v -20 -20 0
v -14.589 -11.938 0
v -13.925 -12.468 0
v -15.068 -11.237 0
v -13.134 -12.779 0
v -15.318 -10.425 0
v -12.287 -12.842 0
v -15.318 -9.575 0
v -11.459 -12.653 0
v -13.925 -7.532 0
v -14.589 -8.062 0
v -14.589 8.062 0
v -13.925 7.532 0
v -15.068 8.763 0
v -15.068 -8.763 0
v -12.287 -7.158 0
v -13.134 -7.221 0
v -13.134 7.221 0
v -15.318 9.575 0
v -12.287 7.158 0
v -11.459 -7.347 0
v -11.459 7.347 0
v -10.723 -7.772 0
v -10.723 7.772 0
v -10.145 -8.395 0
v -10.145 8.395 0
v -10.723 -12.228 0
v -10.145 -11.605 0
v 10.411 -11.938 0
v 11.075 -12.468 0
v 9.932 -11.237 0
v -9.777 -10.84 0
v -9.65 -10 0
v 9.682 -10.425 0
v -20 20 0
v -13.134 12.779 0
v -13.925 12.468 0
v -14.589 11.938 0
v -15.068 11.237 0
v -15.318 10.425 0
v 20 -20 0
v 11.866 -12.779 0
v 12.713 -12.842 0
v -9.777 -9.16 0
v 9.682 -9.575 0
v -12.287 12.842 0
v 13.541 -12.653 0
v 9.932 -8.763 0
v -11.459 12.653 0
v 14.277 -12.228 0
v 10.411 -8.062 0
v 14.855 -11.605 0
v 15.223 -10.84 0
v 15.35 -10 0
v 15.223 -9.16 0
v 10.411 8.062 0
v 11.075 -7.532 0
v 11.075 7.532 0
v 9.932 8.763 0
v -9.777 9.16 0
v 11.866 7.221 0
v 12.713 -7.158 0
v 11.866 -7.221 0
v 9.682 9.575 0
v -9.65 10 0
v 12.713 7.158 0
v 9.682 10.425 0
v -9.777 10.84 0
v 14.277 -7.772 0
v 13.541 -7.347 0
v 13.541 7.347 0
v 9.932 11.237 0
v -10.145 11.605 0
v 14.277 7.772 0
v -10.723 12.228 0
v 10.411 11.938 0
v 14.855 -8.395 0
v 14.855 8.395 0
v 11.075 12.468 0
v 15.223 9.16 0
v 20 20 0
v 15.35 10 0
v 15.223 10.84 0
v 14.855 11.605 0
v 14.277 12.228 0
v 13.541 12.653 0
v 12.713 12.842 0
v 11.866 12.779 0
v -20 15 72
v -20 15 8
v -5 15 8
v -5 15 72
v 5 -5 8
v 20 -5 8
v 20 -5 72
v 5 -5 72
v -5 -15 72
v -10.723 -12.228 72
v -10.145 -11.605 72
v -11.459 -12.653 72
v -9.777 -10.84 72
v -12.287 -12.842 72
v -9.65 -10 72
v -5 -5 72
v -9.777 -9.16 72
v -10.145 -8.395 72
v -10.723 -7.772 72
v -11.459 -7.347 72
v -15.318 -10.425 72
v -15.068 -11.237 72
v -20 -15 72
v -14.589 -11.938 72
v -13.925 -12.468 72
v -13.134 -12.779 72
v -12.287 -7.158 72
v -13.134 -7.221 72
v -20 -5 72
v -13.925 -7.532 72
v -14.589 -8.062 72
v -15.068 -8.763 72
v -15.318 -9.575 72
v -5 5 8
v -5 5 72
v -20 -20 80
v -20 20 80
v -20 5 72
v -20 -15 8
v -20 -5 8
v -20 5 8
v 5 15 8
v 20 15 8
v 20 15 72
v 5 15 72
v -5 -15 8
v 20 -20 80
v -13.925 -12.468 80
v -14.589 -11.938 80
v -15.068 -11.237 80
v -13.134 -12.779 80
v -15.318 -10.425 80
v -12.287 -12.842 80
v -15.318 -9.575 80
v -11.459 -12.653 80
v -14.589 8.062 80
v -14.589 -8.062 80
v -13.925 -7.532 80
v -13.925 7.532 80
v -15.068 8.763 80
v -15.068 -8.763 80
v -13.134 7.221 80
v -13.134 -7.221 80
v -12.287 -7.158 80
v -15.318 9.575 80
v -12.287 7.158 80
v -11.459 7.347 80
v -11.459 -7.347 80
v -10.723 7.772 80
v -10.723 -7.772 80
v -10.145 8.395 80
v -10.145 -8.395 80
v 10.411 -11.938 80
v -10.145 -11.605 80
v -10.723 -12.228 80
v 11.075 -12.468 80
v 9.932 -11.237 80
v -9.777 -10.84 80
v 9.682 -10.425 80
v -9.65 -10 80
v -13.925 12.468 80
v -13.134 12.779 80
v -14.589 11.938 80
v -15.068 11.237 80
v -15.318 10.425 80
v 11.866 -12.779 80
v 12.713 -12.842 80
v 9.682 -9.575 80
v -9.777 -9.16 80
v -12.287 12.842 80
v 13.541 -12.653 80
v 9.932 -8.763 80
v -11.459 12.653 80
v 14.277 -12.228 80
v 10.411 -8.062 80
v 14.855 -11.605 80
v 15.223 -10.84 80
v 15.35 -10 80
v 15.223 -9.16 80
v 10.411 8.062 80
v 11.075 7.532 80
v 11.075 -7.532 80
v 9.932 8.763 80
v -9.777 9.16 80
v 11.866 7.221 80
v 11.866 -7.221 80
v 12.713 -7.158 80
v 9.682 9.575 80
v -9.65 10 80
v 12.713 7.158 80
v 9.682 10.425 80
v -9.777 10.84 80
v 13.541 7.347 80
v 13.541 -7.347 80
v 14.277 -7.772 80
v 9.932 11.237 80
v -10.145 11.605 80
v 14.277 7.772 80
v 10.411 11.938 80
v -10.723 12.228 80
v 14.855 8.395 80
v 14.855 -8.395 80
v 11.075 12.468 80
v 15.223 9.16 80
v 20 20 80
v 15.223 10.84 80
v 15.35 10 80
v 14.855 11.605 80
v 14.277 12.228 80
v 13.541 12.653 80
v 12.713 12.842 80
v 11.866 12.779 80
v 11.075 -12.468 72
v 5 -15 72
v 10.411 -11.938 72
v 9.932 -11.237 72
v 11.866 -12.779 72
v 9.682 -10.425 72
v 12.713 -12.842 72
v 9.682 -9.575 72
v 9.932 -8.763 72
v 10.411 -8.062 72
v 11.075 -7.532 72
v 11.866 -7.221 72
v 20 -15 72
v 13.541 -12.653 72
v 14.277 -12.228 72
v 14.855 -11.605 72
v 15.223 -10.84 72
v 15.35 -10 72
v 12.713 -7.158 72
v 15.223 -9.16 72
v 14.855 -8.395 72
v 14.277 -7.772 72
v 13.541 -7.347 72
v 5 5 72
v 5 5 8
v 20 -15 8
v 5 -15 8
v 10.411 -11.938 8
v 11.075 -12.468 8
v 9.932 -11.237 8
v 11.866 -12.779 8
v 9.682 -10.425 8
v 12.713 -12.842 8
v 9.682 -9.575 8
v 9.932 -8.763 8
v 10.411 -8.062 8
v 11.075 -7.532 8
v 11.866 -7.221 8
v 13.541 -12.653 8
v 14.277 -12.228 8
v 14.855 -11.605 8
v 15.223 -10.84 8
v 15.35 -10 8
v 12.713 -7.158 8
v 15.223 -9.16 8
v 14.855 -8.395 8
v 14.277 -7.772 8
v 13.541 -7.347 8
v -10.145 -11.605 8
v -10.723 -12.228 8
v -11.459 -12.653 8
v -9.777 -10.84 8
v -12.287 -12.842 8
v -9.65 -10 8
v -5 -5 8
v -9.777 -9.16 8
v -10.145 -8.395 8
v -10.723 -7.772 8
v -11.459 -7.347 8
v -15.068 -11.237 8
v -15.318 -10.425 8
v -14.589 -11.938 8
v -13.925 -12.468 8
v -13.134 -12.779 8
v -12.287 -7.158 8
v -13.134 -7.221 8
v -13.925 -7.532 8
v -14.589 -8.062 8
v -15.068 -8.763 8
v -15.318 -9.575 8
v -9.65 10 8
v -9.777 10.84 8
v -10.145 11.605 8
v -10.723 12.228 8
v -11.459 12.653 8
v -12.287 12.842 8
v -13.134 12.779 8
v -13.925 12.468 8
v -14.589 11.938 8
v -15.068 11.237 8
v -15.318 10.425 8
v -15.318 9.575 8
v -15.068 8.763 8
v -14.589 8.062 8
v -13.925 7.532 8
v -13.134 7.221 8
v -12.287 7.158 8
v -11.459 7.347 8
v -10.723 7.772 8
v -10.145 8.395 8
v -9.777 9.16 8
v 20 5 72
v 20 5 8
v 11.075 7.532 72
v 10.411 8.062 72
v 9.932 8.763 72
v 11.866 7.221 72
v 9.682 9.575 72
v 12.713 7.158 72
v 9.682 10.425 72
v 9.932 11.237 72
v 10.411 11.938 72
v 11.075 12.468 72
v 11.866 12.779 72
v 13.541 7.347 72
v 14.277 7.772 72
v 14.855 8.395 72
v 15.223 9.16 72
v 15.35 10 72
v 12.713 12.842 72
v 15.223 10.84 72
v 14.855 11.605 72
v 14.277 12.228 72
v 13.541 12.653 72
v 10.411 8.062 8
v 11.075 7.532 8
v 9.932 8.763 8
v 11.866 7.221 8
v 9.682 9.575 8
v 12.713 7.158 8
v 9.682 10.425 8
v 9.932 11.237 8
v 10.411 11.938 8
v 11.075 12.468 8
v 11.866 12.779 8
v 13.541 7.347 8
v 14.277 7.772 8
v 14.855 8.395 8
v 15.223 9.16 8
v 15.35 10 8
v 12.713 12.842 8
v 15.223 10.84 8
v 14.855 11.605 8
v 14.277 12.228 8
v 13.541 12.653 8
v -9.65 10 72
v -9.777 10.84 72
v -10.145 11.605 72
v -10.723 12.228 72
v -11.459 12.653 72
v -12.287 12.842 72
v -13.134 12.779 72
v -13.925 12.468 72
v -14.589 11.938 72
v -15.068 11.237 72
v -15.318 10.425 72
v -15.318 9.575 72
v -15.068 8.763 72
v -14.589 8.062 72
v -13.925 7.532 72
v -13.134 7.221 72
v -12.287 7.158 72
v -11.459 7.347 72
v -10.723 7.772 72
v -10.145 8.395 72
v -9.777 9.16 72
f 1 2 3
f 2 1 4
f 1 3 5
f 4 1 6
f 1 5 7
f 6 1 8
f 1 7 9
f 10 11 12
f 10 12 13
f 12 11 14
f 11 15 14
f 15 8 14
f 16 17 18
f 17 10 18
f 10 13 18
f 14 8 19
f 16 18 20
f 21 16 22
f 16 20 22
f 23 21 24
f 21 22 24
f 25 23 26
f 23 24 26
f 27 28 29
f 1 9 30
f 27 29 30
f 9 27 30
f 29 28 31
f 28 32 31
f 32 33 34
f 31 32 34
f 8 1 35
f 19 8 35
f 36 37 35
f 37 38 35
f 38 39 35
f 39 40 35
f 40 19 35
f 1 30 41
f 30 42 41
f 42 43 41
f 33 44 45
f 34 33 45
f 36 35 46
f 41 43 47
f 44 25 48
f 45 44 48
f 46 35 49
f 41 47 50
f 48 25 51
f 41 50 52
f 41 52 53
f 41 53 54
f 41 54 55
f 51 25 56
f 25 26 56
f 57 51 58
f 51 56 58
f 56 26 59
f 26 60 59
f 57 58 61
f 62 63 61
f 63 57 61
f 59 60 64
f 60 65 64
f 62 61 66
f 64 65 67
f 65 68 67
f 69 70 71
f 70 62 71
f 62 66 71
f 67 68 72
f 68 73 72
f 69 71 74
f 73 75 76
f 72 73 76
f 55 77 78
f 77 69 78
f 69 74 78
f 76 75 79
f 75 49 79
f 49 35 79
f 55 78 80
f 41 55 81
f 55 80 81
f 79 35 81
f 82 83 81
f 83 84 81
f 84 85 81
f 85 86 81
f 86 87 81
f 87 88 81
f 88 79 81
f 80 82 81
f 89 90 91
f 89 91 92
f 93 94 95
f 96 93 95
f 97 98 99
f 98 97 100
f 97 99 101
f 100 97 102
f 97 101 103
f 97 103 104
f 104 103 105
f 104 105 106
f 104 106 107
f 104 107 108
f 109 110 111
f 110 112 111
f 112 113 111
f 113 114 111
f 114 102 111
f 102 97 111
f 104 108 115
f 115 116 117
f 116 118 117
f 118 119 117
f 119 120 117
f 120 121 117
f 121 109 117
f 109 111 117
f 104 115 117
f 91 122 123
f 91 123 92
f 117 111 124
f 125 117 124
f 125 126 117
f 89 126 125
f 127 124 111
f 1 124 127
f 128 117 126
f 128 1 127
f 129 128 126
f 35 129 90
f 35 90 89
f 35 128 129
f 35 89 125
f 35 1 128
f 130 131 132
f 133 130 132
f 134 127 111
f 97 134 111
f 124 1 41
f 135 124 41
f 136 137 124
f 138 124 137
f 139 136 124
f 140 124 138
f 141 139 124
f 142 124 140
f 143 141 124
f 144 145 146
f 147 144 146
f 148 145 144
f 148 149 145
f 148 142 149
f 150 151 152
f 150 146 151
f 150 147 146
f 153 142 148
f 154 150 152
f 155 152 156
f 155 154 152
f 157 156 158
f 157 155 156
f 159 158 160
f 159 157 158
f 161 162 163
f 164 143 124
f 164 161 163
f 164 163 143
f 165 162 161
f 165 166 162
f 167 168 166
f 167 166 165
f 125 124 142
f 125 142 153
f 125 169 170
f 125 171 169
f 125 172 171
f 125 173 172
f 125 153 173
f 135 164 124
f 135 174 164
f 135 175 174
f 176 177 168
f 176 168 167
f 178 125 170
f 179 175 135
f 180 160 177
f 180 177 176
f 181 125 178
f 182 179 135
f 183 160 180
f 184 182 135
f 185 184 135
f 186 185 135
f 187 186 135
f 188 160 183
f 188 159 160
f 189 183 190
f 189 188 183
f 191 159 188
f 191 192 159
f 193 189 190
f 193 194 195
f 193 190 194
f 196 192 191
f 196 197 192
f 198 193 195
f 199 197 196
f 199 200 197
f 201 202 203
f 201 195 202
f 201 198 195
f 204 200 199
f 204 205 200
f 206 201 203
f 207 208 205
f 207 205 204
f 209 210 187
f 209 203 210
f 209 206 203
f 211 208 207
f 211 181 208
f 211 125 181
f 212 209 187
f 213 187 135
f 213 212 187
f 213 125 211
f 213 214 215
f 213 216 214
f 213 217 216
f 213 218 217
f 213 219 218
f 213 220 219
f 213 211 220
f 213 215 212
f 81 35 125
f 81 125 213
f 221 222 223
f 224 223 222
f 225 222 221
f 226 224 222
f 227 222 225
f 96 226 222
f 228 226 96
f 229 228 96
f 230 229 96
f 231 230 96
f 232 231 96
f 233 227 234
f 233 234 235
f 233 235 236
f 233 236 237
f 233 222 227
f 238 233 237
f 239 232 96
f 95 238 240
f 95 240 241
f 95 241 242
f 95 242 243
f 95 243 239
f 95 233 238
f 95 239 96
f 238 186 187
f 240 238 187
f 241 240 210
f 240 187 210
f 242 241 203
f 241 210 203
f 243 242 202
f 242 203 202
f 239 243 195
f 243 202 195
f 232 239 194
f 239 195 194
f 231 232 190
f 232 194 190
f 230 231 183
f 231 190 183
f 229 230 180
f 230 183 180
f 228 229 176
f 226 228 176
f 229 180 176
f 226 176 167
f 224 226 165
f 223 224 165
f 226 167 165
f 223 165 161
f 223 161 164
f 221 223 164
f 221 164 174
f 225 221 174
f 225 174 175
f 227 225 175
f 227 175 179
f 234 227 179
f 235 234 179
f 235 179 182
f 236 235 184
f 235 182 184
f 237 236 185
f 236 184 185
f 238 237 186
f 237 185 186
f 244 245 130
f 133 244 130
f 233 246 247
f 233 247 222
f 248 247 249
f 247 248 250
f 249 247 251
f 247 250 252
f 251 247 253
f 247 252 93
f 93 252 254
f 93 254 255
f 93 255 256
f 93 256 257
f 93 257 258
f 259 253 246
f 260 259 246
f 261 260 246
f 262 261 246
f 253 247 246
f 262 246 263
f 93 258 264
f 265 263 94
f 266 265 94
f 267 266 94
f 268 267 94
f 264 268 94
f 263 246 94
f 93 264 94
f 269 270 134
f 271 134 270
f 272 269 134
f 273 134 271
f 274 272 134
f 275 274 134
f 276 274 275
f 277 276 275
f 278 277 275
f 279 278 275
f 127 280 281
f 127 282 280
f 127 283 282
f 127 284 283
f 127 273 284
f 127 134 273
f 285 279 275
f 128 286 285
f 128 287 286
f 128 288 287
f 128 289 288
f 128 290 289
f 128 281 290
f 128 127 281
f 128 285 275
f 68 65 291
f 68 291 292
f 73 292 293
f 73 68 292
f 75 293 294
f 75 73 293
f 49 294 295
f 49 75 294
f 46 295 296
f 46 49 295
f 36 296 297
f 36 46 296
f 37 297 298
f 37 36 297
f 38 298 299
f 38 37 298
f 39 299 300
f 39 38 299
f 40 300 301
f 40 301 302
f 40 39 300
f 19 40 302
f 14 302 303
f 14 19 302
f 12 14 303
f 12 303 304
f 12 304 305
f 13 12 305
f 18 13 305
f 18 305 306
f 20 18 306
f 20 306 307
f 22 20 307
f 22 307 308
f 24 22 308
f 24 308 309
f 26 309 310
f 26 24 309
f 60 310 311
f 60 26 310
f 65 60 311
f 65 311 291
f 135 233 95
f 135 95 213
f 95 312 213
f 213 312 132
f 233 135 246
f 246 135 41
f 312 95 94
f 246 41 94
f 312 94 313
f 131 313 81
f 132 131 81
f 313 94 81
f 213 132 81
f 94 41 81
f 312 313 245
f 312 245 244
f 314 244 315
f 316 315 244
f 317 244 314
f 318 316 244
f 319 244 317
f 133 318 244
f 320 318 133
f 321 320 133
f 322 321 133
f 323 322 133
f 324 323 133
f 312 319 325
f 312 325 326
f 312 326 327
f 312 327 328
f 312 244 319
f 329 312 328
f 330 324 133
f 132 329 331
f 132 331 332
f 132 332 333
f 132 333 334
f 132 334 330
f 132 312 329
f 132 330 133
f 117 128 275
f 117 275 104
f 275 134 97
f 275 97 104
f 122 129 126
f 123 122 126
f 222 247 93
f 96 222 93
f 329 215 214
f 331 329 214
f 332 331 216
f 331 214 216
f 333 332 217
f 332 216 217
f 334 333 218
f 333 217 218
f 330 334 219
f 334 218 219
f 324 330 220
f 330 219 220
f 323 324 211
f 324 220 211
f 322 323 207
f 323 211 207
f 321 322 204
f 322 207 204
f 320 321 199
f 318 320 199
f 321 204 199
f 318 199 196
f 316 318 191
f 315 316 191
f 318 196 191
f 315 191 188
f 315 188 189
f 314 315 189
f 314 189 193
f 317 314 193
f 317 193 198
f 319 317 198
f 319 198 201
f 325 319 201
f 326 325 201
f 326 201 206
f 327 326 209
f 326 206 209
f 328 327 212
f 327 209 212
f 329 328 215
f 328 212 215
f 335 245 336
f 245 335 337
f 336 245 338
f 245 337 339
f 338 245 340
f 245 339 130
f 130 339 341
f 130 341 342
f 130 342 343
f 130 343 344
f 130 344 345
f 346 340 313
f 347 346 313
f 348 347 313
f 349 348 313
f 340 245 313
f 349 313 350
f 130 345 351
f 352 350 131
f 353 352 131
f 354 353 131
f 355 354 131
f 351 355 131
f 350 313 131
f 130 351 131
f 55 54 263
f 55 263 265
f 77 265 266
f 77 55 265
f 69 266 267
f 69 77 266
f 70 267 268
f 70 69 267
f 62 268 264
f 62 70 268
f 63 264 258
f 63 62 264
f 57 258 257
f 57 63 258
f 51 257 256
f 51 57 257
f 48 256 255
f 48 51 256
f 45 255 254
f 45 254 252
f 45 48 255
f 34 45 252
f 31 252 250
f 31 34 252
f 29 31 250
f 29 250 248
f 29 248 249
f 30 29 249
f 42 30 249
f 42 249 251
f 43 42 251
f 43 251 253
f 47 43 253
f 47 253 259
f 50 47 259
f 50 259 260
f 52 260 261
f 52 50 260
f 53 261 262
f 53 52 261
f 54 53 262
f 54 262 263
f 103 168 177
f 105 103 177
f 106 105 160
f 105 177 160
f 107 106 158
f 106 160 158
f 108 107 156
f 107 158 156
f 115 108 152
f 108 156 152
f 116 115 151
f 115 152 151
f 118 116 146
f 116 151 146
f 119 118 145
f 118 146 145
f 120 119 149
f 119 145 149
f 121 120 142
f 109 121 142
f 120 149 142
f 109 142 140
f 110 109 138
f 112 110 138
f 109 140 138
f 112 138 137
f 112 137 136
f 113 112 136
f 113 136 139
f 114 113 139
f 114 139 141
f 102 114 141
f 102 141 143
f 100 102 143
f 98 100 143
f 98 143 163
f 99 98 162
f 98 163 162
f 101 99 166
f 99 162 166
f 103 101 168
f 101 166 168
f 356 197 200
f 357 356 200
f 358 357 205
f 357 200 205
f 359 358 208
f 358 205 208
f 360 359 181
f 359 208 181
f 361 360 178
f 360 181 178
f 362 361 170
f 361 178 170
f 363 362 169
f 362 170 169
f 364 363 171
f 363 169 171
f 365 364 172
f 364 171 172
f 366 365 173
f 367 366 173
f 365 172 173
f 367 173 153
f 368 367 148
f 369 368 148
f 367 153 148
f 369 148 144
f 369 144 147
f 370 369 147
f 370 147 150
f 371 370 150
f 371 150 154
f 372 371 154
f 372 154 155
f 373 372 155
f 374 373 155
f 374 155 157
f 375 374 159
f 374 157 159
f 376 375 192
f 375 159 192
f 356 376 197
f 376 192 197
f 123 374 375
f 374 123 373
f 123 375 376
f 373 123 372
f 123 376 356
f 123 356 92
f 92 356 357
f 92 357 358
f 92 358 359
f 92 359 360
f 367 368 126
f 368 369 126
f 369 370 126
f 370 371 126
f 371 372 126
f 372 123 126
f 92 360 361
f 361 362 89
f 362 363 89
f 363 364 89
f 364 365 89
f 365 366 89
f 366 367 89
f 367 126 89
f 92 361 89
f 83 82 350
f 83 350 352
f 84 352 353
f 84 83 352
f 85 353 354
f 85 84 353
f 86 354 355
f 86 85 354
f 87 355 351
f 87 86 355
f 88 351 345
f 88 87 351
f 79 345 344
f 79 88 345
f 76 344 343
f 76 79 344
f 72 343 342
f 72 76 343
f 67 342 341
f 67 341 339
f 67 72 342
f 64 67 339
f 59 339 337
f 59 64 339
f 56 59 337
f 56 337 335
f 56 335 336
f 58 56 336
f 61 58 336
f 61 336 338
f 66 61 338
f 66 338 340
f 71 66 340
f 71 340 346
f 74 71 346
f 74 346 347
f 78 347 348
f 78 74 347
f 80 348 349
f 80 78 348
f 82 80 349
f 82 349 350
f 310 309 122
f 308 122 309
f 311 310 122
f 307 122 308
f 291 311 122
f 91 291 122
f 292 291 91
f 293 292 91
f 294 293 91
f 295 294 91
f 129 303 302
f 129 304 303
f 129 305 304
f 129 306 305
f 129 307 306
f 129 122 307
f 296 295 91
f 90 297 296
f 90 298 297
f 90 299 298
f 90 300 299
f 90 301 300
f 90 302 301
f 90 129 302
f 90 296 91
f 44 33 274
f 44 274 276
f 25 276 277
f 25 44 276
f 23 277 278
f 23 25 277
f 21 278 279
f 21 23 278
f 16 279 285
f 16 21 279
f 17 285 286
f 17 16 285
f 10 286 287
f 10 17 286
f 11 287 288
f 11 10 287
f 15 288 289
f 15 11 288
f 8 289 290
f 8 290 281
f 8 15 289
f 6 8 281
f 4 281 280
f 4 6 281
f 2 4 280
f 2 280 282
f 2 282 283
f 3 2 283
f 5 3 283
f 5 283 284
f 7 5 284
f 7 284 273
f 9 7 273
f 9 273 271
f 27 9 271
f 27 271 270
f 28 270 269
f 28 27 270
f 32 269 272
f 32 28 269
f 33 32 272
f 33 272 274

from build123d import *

# Parameters (mm, degrees)
F0_W     = 40
F0_H     = 40
F1_DEPTH = 80
F2_W     = 10
F2_H     = 64
F3_DEPTH = 15
F6_R     = 2.85
F7_DEPTH = 8


with BuildPart() as f1:
    # F0 (on Top) → F1 (new body)
    with BuildSketch(Plane.XY):
        Rectangle(F0_W, F0_H)
    extrude(amount=F1_DEPTH)


with BuildPart() as f3:
    # F2 (on face) → F3 (new body)
    with BuildSketch(Plane.YZ.offset(20)):
        with Locations((-10, 40)):
            Rectangle(F2_W, F2_H)
        with Locations((10, 40)):
            Rectangle(F2_W, F2_H)
    extrude(amount=-F3_DEPTH)


with BuildPart() as f4_1:
    # F4: instance of F3
    add(f3.part.mirror(Plane.YZ))


with BuildPart() as f1_1:
    add(f1.part)

    # F5: cut F3, F4_1
    add(f3.part, mode=Mode.SUBTRACT)
    add(f4_1.part, mode=Mode.SUBTRACT)


with BuildPart() as f7:
    # F6 (on face) → F7 (new body, through all)
    with BuildSketch(Plane.XY.offset(80)):
        with Locations((12.5, -10)):
            Circle(F6_R)
        with Locations((12.5, 10)):
            Circle(F6_R)
        with Locations((-12.5, 10)):
            Circle(F6_R)
        with Locations((-12.5, -10)):
            Circle(F6_R)
    extrude(amount=-F7_DEPTH)


with BuildPart() as f9_1:
    # F9: instance of F7
    add(f7.part.mirror(Plane(origin=(12.5, 10, 40), x_dir=(1, 0, 0), z_dir=(0, 0, 1))))


with BuildPart() as f1_2:
    add(f1_1.part)

    # F10: cut F7, F9_1
    add(f7.part, mode=Mode.SUBTRACT)
    add(f9_1.part, mode=Mode.SUBTRACT)


solid = f1_2.part
